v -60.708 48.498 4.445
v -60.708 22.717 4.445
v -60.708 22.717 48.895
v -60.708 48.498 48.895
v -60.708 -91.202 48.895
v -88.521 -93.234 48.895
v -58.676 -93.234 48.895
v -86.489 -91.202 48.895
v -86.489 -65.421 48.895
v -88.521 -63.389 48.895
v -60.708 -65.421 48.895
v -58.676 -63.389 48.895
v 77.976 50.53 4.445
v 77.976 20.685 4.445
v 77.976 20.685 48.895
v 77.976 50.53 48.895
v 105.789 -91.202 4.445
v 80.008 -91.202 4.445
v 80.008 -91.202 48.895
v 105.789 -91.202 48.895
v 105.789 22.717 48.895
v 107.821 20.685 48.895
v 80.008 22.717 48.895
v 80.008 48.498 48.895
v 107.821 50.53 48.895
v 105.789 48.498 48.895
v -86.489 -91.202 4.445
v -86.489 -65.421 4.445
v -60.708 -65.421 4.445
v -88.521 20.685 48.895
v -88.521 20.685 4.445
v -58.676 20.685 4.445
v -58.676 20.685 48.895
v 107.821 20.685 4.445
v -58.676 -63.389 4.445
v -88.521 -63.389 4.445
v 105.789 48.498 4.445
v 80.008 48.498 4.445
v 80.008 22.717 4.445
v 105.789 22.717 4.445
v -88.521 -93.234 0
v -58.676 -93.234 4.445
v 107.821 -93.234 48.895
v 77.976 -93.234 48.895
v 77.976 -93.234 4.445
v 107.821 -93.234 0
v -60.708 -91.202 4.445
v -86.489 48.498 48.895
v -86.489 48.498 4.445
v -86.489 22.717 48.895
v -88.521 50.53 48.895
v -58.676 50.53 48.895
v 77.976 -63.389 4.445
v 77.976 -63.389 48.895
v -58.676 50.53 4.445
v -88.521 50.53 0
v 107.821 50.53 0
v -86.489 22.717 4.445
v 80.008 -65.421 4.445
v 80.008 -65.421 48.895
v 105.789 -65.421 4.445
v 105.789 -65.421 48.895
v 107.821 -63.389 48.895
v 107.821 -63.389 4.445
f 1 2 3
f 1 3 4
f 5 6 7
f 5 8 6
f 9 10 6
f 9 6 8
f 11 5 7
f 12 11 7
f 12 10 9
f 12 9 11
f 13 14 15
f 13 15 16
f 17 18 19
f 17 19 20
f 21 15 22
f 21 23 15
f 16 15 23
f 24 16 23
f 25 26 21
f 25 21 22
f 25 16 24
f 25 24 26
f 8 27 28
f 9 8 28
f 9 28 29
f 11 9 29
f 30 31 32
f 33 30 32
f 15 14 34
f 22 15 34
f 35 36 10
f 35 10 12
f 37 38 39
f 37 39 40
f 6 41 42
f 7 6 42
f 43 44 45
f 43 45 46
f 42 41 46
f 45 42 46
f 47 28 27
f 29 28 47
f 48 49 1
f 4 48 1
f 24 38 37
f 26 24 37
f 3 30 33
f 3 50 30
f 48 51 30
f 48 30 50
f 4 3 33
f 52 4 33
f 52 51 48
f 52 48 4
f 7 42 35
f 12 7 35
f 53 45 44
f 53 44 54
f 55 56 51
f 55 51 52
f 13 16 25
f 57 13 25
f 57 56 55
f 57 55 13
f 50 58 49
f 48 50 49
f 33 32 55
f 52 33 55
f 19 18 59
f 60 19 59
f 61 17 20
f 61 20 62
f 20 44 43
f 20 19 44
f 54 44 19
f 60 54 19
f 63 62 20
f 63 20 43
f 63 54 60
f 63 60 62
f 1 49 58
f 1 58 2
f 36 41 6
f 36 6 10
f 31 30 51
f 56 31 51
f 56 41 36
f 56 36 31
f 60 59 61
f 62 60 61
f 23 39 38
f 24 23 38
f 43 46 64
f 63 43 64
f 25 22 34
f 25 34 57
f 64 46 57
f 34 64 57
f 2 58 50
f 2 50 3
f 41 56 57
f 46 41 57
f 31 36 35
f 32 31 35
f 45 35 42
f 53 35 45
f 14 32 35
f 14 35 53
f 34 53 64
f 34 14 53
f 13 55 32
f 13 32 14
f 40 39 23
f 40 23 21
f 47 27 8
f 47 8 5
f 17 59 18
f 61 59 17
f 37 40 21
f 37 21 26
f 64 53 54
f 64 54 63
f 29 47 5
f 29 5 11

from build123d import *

# Parameters (mm, degrees)
F0_W     = 196.342
F0_H     = 143.764
F1_DEPTH = 4.445
F2_W     = 29.845
F2_H     = 29.845
F2_W_2   = 25.781
F2_H_2   = 25.781
F3_DEPTH = 44.45


with BuildPart() as f1:
    # F0 (on Top) → F1 (new body)
    with BuildSketch(Plane.XY):
        with Locations((9.649968, -21.351978)):
            Rectangle(F0_W, F0_H)
    extrude(amount=F1_DEPTH)

    # F2 (on face) → F3 (join)
    with BuildSketch(Plane.XY.offset(4.445)):
        with Locations((-73.598532, 35.607522)):
            Rectangle(F2_W, F2_H)
        with Locations((-73.598532, 35.607522)):
            Rectangle(F2_W_2, F2_H_2, mode=Mode.SUBTRACT)
        with Locations((92.898468, 35.607522)):
            Rectangle(F2_W, F2_H)
        with Locations((92.898468, 35.607522)):
            Rectangle(F2_W_2, F2_H_2, mode=Mode.SUBTRACT)
        with Locations((92.898468, -78.311478)):
            Rectangle(F2_W, F2_H)
        with Locations((92.898468, -78.311478)):
            Rectangle(F2_W_2, F2_H_2, mode=Mode.SUBTRACT)
        with Locations((-73.598532, -78.311478)):
            Rectangle(F2_W, F2_H)
        with Locations((-73.598532, -78.311478)):
            Rectangle(F2_W_2, F2_H_2, mode=Mode.SUBTRACT)
    extrude(amount=F3_DEPTH)


solid = f1.part
